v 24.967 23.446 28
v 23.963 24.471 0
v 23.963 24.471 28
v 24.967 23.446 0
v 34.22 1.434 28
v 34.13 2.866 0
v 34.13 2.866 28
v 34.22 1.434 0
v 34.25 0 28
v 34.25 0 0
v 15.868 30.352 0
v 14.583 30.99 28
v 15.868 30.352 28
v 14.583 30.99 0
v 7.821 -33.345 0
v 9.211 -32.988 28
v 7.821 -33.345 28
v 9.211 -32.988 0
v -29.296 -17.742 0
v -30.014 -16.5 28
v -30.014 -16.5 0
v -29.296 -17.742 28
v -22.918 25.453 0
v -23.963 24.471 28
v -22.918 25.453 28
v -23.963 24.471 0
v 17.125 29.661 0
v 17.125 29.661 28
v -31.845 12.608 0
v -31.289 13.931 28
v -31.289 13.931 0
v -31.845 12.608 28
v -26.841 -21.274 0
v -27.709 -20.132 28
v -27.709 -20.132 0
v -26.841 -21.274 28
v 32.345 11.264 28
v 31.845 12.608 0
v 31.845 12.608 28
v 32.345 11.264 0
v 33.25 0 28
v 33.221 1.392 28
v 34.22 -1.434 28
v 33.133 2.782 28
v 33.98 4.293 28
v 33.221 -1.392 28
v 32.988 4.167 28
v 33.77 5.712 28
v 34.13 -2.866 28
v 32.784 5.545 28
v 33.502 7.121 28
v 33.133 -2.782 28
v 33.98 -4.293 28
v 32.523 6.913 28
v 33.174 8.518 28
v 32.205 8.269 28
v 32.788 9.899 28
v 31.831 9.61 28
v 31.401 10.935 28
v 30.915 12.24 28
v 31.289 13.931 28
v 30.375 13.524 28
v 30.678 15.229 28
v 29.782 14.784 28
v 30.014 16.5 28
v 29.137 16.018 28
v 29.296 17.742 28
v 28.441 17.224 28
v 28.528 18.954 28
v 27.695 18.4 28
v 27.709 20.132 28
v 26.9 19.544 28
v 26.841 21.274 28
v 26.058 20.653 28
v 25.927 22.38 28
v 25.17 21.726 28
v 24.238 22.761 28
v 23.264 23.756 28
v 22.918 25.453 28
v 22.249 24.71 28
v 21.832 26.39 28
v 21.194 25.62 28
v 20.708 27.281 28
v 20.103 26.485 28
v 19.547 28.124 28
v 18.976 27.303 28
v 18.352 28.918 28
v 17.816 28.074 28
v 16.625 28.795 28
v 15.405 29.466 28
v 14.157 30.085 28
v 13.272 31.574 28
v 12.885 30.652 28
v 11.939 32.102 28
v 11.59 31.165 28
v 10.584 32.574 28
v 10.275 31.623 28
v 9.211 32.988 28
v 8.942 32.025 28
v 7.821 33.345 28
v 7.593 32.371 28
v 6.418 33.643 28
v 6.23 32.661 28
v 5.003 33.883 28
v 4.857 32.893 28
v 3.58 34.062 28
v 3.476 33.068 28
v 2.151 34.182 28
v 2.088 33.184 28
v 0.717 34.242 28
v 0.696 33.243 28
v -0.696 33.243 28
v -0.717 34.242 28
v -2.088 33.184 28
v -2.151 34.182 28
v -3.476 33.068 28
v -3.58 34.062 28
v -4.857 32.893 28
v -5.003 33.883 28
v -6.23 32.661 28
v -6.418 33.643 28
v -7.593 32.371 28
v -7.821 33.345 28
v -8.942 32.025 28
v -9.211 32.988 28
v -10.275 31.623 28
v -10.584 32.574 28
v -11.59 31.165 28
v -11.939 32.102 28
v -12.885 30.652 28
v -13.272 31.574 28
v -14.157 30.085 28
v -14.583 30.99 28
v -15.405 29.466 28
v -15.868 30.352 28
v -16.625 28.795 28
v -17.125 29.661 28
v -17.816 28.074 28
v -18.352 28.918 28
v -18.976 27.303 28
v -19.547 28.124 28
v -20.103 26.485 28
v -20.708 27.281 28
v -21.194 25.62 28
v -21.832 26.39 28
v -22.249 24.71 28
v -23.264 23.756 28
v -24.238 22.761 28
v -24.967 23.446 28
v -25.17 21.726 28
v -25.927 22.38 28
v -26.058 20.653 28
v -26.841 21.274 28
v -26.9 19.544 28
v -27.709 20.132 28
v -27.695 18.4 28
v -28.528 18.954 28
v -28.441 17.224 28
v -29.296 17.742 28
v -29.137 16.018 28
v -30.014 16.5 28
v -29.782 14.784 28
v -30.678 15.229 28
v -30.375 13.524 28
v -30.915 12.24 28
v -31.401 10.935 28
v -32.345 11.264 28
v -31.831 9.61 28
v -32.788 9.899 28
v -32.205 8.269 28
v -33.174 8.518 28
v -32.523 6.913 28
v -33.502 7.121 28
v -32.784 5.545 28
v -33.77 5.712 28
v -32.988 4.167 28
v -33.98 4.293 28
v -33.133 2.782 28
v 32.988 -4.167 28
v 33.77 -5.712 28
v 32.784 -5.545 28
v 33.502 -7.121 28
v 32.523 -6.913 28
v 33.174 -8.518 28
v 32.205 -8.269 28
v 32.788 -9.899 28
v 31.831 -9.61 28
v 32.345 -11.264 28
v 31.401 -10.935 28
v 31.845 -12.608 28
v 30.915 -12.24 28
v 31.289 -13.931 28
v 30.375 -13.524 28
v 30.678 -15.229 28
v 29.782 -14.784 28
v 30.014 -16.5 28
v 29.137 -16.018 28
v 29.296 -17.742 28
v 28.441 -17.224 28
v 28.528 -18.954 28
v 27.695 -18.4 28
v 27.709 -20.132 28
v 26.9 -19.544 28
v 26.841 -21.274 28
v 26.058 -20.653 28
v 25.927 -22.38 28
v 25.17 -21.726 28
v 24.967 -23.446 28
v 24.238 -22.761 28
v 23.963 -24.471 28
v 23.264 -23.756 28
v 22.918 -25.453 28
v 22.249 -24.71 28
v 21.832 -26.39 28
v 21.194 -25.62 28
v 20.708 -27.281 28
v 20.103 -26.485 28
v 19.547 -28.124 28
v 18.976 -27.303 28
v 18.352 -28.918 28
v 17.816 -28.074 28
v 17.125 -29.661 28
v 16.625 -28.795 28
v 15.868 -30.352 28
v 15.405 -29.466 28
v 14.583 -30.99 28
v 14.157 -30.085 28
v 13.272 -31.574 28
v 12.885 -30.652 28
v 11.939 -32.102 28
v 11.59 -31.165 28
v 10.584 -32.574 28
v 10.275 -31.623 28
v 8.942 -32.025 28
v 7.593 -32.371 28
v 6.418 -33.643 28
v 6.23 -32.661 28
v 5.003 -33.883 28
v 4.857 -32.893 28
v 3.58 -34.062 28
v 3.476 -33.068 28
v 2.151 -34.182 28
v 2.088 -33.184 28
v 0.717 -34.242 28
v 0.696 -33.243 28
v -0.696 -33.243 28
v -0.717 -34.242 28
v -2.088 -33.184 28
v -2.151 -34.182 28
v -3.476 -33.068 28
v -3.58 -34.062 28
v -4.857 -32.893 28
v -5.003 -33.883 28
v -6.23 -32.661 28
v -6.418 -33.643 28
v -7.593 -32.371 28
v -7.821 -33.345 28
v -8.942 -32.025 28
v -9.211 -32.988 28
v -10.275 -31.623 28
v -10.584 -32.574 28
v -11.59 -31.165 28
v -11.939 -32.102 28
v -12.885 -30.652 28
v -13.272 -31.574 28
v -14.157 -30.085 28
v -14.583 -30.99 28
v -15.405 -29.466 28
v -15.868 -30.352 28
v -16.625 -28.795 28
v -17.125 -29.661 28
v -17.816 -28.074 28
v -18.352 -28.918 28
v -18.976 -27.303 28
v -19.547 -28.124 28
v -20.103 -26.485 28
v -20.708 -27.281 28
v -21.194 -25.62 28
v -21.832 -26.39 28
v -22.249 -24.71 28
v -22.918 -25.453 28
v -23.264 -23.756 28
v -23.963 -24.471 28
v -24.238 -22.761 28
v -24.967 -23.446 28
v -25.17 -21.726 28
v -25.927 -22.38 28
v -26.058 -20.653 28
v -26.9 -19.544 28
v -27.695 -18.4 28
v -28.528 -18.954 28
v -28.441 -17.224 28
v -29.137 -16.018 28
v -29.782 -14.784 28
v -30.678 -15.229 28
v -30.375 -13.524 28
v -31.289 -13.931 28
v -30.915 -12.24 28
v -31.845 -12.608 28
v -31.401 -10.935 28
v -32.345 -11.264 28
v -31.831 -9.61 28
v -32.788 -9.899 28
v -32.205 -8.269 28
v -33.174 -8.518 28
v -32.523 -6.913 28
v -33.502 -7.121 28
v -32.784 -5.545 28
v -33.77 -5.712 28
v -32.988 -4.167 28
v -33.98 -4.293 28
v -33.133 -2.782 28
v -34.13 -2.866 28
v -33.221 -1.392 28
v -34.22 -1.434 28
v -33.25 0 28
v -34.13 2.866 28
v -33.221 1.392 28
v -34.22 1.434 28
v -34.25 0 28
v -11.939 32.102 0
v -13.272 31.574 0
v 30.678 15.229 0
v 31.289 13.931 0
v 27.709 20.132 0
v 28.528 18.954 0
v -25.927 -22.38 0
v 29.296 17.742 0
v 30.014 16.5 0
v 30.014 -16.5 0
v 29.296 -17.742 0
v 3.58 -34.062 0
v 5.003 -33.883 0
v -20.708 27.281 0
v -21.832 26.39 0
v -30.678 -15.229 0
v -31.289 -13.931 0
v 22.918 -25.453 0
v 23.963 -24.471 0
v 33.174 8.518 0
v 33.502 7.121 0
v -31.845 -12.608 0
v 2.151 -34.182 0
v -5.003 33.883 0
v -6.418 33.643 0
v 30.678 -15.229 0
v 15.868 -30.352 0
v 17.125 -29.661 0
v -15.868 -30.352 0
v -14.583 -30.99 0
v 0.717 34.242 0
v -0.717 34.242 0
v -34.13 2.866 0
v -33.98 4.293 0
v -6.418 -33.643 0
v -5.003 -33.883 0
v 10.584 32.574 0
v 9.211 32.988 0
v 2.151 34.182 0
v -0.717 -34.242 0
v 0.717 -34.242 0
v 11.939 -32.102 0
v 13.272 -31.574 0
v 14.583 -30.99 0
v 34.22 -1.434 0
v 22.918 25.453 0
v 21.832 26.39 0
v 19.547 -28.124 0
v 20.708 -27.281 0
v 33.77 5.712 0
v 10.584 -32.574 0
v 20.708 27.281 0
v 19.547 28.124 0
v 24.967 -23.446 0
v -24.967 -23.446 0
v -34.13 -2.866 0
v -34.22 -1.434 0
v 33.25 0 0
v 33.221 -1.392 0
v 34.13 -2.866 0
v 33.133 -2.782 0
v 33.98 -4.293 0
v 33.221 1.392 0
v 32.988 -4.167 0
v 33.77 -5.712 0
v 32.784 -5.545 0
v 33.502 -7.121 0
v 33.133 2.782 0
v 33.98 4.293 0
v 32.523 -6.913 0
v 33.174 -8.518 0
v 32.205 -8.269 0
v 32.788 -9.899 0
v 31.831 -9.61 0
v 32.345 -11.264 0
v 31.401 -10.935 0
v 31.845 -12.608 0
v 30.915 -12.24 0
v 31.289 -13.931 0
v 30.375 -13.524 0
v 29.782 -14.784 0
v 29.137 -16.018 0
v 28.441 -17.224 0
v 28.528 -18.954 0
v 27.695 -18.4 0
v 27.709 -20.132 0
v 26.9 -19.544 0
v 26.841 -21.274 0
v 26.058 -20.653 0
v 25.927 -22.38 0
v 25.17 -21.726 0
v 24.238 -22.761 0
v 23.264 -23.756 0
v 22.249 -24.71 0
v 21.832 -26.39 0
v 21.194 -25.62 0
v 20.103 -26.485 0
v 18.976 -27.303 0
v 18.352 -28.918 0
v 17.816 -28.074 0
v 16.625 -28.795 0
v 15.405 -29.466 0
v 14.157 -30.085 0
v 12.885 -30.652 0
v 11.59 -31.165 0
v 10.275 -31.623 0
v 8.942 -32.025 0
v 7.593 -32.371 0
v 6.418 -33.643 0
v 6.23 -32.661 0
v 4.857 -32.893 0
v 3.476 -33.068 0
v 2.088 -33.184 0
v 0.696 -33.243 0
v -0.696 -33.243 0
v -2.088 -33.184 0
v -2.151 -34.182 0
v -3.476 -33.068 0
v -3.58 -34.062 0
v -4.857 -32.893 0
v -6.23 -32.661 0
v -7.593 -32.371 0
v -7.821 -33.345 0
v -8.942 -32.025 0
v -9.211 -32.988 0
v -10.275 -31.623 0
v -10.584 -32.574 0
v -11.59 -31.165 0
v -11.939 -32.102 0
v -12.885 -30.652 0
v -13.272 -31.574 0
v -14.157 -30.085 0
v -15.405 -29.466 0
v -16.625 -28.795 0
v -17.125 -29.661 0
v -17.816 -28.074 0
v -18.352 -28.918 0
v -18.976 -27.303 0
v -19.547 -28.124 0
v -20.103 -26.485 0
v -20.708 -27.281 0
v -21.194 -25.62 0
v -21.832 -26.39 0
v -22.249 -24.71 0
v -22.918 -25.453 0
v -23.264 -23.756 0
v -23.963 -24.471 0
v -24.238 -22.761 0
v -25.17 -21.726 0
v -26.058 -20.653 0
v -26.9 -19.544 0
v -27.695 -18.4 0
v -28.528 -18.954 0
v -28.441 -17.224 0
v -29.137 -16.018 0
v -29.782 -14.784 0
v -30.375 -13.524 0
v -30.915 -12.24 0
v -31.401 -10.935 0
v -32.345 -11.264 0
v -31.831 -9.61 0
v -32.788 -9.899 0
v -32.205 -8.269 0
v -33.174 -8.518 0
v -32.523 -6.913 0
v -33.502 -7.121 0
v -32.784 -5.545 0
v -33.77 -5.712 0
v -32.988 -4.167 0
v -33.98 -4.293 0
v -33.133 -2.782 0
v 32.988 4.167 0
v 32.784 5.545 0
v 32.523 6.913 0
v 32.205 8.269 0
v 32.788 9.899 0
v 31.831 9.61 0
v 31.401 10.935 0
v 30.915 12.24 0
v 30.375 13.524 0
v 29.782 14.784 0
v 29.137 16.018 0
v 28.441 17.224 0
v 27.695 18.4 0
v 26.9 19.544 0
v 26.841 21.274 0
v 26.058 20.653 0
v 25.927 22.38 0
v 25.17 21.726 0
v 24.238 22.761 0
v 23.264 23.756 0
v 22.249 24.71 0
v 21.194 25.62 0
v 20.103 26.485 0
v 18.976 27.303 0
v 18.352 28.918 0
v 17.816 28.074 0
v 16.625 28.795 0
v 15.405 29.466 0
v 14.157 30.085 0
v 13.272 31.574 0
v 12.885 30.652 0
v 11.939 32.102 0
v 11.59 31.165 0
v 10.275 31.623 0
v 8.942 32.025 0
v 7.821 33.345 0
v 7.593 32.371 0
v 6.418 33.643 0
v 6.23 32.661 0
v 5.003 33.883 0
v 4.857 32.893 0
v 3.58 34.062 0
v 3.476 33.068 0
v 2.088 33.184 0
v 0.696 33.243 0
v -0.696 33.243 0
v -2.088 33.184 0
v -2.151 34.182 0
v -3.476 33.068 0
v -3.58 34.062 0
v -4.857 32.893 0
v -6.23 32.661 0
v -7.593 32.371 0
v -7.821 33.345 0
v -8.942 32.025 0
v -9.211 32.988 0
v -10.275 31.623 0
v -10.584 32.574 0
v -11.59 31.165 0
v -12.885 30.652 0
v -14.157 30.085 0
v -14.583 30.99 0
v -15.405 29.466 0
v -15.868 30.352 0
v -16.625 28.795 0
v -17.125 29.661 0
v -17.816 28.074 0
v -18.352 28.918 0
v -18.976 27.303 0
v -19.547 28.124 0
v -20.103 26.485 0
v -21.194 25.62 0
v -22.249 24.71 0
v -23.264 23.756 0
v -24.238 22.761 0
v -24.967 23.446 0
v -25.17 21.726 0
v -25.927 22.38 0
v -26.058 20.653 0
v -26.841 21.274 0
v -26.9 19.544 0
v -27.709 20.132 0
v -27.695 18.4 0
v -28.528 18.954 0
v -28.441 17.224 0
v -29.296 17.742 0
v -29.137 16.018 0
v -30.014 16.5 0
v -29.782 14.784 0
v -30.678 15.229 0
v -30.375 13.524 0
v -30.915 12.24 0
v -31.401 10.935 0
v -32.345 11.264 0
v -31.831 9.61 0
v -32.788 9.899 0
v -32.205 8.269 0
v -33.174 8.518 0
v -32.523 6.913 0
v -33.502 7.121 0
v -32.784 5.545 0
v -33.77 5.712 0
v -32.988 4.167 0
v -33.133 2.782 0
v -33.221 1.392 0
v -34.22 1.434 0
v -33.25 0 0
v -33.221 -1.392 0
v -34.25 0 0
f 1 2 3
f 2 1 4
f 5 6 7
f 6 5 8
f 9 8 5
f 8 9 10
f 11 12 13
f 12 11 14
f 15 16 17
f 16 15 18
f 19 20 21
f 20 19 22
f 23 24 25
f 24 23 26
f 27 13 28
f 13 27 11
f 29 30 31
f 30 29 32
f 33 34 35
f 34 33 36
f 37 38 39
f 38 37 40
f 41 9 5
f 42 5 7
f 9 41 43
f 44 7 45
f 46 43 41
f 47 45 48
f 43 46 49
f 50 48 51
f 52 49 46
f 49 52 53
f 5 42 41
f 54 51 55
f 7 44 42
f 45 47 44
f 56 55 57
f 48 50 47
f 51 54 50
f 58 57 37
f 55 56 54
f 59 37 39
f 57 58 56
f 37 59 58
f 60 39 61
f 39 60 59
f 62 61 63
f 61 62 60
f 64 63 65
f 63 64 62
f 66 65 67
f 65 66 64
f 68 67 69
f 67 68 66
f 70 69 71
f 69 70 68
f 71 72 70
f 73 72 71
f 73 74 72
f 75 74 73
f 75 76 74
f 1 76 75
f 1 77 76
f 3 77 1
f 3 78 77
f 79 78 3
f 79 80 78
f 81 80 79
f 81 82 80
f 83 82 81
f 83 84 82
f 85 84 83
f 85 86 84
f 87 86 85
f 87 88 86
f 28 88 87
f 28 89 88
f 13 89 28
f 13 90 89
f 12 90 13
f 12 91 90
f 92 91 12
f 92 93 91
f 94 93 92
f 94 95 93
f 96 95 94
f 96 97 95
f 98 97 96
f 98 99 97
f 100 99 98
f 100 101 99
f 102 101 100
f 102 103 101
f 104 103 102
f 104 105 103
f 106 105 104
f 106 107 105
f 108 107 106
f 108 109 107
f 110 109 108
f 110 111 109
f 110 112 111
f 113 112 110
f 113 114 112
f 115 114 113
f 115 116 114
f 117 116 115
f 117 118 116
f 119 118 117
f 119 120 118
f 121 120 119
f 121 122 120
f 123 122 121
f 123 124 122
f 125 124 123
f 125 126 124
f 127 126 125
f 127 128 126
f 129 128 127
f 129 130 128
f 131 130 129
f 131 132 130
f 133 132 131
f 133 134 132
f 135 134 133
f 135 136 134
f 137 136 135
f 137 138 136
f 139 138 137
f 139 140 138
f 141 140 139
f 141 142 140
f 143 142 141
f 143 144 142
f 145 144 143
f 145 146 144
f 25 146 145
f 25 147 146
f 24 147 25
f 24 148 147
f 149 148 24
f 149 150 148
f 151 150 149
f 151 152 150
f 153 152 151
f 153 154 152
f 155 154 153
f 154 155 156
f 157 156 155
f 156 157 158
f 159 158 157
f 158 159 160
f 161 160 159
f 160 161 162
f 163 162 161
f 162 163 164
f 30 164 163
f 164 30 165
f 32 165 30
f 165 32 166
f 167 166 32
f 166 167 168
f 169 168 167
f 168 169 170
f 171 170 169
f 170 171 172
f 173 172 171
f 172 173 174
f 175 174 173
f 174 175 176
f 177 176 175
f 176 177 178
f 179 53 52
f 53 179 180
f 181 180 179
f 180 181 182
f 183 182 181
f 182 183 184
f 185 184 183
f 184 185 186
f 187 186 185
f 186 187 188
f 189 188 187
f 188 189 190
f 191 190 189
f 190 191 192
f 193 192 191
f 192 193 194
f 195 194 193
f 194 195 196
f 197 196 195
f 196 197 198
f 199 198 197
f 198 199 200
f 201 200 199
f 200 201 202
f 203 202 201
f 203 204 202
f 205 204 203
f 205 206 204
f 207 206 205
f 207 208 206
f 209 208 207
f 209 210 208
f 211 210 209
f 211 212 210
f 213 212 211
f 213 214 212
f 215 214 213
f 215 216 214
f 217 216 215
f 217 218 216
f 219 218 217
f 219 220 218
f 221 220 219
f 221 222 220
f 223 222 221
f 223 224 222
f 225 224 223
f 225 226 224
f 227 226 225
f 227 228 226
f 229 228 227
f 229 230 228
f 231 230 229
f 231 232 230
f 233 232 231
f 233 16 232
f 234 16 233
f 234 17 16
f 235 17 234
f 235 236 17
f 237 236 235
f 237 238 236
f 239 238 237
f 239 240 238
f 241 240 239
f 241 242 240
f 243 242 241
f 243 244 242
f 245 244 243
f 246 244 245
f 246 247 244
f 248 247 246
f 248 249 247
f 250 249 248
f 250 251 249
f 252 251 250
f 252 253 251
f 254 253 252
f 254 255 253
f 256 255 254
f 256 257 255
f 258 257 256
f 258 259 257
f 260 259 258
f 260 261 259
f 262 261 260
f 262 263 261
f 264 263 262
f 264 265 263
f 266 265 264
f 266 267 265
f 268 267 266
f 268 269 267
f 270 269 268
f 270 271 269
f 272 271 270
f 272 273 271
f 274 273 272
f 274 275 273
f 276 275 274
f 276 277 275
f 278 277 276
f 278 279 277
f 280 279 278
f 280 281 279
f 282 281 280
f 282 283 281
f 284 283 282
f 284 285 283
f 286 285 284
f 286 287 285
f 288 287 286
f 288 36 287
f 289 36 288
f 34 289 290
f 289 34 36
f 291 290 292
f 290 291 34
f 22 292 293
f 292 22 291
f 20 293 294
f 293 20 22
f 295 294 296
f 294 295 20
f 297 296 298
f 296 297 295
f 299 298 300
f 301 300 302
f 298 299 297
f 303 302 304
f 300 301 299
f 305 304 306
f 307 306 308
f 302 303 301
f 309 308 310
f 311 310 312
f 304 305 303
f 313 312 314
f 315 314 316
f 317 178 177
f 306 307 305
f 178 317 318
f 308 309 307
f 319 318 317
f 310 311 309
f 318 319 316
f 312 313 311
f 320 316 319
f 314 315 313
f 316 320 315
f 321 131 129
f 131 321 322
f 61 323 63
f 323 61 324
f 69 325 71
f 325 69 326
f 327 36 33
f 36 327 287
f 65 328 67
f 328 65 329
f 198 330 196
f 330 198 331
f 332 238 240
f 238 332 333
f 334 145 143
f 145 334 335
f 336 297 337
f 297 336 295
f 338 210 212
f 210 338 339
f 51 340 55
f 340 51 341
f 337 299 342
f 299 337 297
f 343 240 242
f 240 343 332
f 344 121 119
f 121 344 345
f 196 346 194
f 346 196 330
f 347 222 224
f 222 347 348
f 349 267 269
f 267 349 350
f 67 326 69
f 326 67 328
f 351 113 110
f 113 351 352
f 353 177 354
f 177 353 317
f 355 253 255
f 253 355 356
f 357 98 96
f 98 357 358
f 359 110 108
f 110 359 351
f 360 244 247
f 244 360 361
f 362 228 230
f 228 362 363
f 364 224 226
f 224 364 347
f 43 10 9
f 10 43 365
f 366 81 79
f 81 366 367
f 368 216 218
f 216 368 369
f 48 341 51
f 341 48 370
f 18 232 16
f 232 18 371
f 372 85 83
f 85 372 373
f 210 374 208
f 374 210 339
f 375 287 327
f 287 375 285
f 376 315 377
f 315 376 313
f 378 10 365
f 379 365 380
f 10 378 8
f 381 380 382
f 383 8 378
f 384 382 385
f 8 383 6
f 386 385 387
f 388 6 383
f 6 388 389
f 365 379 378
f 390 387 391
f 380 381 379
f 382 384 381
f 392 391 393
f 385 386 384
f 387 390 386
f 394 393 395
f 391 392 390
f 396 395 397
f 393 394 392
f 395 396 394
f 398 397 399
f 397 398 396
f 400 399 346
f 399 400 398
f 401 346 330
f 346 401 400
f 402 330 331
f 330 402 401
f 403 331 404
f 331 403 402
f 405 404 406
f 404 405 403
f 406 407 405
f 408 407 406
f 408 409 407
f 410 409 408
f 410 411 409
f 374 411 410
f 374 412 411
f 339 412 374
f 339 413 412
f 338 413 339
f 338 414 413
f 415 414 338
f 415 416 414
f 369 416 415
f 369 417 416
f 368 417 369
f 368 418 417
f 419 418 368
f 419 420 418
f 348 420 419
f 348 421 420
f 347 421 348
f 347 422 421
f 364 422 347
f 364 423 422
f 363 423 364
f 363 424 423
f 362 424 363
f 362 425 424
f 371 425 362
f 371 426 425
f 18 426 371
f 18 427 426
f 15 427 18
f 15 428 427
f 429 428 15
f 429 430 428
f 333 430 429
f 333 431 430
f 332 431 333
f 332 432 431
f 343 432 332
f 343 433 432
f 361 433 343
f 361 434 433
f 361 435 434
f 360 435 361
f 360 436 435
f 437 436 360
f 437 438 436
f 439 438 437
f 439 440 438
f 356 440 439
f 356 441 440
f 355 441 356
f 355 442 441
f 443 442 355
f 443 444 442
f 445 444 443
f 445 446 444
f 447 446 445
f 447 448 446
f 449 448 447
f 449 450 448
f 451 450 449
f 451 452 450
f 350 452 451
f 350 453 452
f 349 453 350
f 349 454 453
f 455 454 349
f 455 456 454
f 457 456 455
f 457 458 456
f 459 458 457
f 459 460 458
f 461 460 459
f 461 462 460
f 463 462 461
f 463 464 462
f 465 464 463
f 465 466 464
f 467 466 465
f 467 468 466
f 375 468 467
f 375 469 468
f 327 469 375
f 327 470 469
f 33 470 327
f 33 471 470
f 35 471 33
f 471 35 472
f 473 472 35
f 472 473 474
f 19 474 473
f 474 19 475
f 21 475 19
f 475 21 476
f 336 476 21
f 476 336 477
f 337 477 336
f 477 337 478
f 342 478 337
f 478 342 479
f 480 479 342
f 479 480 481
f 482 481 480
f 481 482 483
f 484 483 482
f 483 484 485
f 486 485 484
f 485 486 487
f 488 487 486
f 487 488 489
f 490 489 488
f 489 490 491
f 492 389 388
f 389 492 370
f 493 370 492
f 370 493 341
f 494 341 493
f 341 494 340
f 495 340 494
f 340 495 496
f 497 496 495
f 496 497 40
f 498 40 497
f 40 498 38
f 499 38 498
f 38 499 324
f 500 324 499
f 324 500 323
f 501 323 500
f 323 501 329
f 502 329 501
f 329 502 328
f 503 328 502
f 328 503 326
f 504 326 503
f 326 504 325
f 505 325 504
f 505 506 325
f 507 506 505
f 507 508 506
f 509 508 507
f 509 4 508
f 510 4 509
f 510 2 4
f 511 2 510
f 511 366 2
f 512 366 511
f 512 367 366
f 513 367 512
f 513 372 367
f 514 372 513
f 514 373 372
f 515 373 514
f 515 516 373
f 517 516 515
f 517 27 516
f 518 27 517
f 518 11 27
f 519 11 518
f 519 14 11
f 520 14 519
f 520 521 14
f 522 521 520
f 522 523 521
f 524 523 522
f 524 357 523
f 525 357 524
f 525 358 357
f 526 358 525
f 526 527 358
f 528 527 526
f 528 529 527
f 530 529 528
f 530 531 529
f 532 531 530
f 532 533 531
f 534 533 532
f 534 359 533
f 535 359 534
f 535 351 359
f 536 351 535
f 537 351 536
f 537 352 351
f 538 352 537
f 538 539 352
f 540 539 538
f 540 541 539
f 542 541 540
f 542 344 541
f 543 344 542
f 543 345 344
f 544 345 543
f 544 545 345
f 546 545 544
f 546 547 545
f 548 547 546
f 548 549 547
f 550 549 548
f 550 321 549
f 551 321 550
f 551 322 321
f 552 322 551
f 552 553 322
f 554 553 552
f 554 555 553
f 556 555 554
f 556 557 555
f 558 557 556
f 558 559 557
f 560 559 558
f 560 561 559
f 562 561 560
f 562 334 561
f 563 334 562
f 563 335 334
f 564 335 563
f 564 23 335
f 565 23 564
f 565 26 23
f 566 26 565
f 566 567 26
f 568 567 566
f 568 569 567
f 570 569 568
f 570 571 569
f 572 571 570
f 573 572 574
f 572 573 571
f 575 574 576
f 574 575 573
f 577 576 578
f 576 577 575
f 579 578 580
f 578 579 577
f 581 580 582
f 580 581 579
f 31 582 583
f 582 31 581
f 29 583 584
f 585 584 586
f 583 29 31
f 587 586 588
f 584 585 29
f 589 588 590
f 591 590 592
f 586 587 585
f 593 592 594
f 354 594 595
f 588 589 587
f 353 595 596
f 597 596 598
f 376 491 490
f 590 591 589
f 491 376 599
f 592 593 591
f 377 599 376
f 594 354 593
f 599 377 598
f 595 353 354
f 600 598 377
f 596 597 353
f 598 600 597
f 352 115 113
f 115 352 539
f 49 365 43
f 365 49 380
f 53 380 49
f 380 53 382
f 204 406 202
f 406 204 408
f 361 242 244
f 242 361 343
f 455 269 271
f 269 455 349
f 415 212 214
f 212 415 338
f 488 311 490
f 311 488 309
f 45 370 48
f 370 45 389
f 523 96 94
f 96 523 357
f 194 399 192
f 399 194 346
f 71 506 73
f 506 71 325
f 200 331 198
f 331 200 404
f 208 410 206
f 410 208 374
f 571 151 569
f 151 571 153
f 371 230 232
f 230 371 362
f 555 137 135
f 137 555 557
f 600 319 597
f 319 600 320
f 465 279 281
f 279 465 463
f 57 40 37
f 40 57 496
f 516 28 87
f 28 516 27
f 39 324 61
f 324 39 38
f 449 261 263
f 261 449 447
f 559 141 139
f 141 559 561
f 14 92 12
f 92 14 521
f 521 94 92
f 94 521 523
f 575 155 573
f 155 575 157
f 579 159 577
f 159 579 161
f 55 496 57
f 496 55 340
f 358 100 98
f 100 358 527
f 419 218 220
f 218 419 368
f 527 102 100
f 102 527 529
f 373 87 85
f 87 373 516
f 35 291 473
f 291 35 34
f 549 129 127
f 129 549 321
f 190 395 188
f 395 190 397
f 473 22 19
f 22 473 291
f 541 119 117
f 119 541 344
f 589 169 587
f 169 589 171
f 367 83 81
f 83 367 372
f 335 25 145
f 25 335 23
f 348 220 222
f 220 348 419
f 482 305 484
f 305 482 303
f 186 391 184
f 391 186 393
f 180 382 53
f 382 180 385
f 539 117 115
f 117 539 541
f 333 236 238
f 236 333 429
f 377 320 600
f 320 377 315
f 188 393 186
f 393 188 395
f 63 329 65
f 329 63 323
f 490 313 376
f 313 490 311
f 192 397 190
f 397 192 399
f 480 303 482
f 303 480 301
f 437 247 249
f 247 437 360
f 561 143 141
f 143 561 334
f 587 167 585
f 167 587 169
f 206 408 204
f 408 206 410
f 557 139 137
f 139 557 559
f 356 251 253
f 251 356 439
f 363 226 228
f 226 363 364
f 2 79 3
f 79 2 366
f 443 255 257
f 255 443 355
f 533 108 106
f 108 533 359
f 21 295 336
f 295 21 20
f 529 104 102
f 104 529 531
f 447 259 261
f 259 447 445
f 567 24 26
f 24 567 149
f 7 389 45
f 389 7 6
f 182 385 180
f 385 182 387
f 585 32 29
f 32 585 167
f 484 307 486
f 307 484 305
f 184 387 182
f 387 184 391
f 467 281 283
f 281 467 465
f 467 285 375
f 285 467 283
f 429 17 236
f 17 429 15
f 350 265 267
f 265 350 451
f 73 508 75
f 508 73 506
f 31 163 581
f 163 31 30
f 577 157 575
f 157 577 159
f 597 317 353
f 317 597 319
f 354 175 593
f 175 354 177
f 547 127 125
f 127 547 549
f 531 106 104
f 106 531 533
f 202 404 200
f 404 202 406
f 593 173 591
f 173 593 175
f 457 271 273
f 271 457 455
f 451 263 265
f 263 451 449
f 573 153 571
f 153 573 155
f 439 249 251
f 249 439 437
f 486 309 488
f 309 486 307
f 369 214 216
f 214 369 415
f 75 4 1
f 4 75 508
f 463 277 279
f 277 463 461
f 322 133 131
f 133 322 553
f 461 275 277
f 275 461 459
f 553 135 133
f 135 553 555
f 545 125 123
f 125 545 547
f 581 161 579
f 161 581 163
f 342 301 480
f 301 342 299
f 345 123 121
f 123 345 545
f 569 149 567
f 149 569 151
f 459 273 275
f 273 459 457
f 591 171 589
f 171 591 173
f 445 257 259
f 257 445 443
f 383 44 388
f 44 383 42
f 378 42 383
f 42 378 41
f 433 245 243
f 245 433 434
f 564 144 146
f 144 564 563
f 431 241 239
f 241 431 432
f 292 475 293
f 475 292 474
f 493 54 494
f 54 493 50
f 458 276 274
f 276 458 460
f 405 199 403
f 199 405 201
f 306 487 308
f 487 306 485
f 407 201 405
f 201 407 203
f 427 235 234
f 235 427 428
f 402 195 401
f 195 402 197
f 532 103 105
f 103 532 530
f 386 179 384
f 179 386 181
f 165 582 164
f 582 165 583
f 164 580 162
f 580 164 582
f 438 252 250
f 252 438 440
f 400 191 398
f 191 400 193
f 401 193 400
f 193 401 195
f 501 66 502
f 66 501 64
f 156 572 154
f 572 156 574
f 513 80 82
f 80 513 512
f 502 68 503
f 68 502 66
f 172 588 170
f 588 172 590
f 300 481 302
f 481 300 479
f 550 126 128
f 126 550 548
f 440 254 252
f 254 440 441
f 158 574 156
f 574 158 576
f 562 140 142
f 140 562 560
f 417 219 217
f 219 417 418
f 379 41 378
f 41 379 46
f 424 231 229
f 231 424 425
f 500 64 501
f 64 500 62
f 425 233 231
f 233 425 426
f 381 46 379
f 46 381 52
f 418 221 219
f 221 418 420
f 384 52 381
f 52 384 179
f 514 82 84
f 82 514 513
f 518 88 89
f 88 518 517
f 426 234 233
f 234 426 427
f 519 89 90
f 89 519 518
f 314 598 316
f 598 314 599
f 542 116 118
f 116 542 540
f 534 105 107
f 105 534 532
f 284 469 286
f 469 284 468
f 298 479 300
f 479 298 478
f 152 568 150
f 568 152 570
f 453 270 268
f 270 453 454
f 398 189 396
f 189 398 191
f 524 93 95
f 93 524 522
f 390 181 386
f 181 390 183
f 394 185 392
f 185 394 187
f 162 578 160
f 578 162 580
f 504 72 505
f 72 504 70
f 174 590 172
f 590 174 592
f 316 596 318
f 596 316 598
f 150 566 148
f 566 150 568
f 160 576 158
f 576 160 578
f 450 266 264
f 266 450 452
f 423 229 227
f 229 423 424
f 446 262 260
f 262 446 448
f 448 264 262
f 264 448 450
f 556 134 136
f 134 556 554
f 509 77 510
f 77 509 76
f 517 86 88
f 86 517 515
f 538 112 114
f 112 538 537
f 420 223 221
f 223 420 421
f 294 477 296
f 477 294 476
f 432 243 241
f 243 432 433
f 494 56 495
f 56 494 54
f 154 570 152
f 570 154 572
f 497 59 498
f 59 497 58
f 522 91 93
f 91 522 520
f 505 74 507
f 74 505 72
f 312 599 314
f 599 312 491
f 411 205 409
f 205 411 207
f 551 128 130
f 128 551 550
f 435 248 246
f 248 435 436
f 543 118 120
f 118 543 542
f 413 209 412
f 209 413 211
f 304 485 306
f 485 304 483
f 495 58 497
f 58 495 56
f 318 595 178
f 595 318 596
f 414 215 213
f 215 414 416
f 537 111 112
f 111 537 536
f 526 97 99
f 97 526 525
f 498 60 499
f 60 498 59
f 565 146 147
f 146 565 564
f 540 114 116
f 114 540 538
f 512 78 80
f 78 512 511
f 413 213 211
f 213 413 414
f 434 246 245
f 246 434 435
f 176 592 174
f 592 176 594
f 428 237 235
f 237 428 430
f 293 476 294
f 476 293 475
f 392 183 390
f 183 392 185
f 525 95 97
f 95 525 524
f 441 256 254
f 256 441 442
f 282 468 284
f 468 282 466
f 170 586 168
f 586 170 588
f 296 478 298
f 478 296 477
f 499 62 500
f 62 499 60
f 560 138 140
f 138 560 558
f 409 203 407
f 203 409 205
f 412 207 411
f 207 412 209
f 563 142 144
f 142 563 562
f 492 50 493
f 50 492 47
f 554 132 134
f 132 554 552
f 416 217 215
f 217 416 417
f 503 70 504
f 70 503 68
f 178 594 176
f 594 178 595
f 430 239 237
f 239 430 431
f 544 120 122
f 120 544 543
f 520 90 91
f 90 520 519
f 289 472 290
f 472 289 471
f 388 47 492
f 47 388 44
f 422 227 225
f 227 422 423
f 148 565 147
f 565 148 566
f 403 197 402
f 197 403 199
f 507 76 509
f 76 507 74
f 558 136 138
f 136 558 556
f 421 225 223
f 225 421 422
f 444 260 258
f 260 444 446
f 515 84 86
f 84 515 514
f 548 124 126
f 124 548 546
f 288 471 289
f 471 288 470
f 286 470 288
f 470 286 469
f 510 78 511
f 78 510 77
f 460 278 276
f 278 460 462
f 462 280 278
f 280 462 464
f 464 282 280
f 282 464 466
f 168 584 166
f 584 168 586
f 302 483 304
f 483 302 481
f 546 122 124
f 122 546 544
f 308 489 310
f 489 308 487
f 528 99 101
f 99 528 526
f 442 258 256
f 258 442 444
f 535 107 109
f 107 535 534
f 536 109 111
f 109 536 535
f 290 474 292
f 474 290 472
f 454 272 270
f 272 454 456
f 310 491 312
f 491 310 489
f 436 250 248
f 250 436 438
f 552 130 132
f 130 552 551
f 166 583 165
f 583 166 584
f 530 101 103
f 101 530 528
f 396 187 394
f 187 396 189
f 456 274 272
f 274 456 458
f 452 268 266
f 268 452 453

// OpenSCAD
$fn = 150;

difference() {
	cylinder(d = 68.5, h = 28);
	translate(v = [0, 0, -1]) {
		cylinder(d = 66.5, h = 30);
	}
}
